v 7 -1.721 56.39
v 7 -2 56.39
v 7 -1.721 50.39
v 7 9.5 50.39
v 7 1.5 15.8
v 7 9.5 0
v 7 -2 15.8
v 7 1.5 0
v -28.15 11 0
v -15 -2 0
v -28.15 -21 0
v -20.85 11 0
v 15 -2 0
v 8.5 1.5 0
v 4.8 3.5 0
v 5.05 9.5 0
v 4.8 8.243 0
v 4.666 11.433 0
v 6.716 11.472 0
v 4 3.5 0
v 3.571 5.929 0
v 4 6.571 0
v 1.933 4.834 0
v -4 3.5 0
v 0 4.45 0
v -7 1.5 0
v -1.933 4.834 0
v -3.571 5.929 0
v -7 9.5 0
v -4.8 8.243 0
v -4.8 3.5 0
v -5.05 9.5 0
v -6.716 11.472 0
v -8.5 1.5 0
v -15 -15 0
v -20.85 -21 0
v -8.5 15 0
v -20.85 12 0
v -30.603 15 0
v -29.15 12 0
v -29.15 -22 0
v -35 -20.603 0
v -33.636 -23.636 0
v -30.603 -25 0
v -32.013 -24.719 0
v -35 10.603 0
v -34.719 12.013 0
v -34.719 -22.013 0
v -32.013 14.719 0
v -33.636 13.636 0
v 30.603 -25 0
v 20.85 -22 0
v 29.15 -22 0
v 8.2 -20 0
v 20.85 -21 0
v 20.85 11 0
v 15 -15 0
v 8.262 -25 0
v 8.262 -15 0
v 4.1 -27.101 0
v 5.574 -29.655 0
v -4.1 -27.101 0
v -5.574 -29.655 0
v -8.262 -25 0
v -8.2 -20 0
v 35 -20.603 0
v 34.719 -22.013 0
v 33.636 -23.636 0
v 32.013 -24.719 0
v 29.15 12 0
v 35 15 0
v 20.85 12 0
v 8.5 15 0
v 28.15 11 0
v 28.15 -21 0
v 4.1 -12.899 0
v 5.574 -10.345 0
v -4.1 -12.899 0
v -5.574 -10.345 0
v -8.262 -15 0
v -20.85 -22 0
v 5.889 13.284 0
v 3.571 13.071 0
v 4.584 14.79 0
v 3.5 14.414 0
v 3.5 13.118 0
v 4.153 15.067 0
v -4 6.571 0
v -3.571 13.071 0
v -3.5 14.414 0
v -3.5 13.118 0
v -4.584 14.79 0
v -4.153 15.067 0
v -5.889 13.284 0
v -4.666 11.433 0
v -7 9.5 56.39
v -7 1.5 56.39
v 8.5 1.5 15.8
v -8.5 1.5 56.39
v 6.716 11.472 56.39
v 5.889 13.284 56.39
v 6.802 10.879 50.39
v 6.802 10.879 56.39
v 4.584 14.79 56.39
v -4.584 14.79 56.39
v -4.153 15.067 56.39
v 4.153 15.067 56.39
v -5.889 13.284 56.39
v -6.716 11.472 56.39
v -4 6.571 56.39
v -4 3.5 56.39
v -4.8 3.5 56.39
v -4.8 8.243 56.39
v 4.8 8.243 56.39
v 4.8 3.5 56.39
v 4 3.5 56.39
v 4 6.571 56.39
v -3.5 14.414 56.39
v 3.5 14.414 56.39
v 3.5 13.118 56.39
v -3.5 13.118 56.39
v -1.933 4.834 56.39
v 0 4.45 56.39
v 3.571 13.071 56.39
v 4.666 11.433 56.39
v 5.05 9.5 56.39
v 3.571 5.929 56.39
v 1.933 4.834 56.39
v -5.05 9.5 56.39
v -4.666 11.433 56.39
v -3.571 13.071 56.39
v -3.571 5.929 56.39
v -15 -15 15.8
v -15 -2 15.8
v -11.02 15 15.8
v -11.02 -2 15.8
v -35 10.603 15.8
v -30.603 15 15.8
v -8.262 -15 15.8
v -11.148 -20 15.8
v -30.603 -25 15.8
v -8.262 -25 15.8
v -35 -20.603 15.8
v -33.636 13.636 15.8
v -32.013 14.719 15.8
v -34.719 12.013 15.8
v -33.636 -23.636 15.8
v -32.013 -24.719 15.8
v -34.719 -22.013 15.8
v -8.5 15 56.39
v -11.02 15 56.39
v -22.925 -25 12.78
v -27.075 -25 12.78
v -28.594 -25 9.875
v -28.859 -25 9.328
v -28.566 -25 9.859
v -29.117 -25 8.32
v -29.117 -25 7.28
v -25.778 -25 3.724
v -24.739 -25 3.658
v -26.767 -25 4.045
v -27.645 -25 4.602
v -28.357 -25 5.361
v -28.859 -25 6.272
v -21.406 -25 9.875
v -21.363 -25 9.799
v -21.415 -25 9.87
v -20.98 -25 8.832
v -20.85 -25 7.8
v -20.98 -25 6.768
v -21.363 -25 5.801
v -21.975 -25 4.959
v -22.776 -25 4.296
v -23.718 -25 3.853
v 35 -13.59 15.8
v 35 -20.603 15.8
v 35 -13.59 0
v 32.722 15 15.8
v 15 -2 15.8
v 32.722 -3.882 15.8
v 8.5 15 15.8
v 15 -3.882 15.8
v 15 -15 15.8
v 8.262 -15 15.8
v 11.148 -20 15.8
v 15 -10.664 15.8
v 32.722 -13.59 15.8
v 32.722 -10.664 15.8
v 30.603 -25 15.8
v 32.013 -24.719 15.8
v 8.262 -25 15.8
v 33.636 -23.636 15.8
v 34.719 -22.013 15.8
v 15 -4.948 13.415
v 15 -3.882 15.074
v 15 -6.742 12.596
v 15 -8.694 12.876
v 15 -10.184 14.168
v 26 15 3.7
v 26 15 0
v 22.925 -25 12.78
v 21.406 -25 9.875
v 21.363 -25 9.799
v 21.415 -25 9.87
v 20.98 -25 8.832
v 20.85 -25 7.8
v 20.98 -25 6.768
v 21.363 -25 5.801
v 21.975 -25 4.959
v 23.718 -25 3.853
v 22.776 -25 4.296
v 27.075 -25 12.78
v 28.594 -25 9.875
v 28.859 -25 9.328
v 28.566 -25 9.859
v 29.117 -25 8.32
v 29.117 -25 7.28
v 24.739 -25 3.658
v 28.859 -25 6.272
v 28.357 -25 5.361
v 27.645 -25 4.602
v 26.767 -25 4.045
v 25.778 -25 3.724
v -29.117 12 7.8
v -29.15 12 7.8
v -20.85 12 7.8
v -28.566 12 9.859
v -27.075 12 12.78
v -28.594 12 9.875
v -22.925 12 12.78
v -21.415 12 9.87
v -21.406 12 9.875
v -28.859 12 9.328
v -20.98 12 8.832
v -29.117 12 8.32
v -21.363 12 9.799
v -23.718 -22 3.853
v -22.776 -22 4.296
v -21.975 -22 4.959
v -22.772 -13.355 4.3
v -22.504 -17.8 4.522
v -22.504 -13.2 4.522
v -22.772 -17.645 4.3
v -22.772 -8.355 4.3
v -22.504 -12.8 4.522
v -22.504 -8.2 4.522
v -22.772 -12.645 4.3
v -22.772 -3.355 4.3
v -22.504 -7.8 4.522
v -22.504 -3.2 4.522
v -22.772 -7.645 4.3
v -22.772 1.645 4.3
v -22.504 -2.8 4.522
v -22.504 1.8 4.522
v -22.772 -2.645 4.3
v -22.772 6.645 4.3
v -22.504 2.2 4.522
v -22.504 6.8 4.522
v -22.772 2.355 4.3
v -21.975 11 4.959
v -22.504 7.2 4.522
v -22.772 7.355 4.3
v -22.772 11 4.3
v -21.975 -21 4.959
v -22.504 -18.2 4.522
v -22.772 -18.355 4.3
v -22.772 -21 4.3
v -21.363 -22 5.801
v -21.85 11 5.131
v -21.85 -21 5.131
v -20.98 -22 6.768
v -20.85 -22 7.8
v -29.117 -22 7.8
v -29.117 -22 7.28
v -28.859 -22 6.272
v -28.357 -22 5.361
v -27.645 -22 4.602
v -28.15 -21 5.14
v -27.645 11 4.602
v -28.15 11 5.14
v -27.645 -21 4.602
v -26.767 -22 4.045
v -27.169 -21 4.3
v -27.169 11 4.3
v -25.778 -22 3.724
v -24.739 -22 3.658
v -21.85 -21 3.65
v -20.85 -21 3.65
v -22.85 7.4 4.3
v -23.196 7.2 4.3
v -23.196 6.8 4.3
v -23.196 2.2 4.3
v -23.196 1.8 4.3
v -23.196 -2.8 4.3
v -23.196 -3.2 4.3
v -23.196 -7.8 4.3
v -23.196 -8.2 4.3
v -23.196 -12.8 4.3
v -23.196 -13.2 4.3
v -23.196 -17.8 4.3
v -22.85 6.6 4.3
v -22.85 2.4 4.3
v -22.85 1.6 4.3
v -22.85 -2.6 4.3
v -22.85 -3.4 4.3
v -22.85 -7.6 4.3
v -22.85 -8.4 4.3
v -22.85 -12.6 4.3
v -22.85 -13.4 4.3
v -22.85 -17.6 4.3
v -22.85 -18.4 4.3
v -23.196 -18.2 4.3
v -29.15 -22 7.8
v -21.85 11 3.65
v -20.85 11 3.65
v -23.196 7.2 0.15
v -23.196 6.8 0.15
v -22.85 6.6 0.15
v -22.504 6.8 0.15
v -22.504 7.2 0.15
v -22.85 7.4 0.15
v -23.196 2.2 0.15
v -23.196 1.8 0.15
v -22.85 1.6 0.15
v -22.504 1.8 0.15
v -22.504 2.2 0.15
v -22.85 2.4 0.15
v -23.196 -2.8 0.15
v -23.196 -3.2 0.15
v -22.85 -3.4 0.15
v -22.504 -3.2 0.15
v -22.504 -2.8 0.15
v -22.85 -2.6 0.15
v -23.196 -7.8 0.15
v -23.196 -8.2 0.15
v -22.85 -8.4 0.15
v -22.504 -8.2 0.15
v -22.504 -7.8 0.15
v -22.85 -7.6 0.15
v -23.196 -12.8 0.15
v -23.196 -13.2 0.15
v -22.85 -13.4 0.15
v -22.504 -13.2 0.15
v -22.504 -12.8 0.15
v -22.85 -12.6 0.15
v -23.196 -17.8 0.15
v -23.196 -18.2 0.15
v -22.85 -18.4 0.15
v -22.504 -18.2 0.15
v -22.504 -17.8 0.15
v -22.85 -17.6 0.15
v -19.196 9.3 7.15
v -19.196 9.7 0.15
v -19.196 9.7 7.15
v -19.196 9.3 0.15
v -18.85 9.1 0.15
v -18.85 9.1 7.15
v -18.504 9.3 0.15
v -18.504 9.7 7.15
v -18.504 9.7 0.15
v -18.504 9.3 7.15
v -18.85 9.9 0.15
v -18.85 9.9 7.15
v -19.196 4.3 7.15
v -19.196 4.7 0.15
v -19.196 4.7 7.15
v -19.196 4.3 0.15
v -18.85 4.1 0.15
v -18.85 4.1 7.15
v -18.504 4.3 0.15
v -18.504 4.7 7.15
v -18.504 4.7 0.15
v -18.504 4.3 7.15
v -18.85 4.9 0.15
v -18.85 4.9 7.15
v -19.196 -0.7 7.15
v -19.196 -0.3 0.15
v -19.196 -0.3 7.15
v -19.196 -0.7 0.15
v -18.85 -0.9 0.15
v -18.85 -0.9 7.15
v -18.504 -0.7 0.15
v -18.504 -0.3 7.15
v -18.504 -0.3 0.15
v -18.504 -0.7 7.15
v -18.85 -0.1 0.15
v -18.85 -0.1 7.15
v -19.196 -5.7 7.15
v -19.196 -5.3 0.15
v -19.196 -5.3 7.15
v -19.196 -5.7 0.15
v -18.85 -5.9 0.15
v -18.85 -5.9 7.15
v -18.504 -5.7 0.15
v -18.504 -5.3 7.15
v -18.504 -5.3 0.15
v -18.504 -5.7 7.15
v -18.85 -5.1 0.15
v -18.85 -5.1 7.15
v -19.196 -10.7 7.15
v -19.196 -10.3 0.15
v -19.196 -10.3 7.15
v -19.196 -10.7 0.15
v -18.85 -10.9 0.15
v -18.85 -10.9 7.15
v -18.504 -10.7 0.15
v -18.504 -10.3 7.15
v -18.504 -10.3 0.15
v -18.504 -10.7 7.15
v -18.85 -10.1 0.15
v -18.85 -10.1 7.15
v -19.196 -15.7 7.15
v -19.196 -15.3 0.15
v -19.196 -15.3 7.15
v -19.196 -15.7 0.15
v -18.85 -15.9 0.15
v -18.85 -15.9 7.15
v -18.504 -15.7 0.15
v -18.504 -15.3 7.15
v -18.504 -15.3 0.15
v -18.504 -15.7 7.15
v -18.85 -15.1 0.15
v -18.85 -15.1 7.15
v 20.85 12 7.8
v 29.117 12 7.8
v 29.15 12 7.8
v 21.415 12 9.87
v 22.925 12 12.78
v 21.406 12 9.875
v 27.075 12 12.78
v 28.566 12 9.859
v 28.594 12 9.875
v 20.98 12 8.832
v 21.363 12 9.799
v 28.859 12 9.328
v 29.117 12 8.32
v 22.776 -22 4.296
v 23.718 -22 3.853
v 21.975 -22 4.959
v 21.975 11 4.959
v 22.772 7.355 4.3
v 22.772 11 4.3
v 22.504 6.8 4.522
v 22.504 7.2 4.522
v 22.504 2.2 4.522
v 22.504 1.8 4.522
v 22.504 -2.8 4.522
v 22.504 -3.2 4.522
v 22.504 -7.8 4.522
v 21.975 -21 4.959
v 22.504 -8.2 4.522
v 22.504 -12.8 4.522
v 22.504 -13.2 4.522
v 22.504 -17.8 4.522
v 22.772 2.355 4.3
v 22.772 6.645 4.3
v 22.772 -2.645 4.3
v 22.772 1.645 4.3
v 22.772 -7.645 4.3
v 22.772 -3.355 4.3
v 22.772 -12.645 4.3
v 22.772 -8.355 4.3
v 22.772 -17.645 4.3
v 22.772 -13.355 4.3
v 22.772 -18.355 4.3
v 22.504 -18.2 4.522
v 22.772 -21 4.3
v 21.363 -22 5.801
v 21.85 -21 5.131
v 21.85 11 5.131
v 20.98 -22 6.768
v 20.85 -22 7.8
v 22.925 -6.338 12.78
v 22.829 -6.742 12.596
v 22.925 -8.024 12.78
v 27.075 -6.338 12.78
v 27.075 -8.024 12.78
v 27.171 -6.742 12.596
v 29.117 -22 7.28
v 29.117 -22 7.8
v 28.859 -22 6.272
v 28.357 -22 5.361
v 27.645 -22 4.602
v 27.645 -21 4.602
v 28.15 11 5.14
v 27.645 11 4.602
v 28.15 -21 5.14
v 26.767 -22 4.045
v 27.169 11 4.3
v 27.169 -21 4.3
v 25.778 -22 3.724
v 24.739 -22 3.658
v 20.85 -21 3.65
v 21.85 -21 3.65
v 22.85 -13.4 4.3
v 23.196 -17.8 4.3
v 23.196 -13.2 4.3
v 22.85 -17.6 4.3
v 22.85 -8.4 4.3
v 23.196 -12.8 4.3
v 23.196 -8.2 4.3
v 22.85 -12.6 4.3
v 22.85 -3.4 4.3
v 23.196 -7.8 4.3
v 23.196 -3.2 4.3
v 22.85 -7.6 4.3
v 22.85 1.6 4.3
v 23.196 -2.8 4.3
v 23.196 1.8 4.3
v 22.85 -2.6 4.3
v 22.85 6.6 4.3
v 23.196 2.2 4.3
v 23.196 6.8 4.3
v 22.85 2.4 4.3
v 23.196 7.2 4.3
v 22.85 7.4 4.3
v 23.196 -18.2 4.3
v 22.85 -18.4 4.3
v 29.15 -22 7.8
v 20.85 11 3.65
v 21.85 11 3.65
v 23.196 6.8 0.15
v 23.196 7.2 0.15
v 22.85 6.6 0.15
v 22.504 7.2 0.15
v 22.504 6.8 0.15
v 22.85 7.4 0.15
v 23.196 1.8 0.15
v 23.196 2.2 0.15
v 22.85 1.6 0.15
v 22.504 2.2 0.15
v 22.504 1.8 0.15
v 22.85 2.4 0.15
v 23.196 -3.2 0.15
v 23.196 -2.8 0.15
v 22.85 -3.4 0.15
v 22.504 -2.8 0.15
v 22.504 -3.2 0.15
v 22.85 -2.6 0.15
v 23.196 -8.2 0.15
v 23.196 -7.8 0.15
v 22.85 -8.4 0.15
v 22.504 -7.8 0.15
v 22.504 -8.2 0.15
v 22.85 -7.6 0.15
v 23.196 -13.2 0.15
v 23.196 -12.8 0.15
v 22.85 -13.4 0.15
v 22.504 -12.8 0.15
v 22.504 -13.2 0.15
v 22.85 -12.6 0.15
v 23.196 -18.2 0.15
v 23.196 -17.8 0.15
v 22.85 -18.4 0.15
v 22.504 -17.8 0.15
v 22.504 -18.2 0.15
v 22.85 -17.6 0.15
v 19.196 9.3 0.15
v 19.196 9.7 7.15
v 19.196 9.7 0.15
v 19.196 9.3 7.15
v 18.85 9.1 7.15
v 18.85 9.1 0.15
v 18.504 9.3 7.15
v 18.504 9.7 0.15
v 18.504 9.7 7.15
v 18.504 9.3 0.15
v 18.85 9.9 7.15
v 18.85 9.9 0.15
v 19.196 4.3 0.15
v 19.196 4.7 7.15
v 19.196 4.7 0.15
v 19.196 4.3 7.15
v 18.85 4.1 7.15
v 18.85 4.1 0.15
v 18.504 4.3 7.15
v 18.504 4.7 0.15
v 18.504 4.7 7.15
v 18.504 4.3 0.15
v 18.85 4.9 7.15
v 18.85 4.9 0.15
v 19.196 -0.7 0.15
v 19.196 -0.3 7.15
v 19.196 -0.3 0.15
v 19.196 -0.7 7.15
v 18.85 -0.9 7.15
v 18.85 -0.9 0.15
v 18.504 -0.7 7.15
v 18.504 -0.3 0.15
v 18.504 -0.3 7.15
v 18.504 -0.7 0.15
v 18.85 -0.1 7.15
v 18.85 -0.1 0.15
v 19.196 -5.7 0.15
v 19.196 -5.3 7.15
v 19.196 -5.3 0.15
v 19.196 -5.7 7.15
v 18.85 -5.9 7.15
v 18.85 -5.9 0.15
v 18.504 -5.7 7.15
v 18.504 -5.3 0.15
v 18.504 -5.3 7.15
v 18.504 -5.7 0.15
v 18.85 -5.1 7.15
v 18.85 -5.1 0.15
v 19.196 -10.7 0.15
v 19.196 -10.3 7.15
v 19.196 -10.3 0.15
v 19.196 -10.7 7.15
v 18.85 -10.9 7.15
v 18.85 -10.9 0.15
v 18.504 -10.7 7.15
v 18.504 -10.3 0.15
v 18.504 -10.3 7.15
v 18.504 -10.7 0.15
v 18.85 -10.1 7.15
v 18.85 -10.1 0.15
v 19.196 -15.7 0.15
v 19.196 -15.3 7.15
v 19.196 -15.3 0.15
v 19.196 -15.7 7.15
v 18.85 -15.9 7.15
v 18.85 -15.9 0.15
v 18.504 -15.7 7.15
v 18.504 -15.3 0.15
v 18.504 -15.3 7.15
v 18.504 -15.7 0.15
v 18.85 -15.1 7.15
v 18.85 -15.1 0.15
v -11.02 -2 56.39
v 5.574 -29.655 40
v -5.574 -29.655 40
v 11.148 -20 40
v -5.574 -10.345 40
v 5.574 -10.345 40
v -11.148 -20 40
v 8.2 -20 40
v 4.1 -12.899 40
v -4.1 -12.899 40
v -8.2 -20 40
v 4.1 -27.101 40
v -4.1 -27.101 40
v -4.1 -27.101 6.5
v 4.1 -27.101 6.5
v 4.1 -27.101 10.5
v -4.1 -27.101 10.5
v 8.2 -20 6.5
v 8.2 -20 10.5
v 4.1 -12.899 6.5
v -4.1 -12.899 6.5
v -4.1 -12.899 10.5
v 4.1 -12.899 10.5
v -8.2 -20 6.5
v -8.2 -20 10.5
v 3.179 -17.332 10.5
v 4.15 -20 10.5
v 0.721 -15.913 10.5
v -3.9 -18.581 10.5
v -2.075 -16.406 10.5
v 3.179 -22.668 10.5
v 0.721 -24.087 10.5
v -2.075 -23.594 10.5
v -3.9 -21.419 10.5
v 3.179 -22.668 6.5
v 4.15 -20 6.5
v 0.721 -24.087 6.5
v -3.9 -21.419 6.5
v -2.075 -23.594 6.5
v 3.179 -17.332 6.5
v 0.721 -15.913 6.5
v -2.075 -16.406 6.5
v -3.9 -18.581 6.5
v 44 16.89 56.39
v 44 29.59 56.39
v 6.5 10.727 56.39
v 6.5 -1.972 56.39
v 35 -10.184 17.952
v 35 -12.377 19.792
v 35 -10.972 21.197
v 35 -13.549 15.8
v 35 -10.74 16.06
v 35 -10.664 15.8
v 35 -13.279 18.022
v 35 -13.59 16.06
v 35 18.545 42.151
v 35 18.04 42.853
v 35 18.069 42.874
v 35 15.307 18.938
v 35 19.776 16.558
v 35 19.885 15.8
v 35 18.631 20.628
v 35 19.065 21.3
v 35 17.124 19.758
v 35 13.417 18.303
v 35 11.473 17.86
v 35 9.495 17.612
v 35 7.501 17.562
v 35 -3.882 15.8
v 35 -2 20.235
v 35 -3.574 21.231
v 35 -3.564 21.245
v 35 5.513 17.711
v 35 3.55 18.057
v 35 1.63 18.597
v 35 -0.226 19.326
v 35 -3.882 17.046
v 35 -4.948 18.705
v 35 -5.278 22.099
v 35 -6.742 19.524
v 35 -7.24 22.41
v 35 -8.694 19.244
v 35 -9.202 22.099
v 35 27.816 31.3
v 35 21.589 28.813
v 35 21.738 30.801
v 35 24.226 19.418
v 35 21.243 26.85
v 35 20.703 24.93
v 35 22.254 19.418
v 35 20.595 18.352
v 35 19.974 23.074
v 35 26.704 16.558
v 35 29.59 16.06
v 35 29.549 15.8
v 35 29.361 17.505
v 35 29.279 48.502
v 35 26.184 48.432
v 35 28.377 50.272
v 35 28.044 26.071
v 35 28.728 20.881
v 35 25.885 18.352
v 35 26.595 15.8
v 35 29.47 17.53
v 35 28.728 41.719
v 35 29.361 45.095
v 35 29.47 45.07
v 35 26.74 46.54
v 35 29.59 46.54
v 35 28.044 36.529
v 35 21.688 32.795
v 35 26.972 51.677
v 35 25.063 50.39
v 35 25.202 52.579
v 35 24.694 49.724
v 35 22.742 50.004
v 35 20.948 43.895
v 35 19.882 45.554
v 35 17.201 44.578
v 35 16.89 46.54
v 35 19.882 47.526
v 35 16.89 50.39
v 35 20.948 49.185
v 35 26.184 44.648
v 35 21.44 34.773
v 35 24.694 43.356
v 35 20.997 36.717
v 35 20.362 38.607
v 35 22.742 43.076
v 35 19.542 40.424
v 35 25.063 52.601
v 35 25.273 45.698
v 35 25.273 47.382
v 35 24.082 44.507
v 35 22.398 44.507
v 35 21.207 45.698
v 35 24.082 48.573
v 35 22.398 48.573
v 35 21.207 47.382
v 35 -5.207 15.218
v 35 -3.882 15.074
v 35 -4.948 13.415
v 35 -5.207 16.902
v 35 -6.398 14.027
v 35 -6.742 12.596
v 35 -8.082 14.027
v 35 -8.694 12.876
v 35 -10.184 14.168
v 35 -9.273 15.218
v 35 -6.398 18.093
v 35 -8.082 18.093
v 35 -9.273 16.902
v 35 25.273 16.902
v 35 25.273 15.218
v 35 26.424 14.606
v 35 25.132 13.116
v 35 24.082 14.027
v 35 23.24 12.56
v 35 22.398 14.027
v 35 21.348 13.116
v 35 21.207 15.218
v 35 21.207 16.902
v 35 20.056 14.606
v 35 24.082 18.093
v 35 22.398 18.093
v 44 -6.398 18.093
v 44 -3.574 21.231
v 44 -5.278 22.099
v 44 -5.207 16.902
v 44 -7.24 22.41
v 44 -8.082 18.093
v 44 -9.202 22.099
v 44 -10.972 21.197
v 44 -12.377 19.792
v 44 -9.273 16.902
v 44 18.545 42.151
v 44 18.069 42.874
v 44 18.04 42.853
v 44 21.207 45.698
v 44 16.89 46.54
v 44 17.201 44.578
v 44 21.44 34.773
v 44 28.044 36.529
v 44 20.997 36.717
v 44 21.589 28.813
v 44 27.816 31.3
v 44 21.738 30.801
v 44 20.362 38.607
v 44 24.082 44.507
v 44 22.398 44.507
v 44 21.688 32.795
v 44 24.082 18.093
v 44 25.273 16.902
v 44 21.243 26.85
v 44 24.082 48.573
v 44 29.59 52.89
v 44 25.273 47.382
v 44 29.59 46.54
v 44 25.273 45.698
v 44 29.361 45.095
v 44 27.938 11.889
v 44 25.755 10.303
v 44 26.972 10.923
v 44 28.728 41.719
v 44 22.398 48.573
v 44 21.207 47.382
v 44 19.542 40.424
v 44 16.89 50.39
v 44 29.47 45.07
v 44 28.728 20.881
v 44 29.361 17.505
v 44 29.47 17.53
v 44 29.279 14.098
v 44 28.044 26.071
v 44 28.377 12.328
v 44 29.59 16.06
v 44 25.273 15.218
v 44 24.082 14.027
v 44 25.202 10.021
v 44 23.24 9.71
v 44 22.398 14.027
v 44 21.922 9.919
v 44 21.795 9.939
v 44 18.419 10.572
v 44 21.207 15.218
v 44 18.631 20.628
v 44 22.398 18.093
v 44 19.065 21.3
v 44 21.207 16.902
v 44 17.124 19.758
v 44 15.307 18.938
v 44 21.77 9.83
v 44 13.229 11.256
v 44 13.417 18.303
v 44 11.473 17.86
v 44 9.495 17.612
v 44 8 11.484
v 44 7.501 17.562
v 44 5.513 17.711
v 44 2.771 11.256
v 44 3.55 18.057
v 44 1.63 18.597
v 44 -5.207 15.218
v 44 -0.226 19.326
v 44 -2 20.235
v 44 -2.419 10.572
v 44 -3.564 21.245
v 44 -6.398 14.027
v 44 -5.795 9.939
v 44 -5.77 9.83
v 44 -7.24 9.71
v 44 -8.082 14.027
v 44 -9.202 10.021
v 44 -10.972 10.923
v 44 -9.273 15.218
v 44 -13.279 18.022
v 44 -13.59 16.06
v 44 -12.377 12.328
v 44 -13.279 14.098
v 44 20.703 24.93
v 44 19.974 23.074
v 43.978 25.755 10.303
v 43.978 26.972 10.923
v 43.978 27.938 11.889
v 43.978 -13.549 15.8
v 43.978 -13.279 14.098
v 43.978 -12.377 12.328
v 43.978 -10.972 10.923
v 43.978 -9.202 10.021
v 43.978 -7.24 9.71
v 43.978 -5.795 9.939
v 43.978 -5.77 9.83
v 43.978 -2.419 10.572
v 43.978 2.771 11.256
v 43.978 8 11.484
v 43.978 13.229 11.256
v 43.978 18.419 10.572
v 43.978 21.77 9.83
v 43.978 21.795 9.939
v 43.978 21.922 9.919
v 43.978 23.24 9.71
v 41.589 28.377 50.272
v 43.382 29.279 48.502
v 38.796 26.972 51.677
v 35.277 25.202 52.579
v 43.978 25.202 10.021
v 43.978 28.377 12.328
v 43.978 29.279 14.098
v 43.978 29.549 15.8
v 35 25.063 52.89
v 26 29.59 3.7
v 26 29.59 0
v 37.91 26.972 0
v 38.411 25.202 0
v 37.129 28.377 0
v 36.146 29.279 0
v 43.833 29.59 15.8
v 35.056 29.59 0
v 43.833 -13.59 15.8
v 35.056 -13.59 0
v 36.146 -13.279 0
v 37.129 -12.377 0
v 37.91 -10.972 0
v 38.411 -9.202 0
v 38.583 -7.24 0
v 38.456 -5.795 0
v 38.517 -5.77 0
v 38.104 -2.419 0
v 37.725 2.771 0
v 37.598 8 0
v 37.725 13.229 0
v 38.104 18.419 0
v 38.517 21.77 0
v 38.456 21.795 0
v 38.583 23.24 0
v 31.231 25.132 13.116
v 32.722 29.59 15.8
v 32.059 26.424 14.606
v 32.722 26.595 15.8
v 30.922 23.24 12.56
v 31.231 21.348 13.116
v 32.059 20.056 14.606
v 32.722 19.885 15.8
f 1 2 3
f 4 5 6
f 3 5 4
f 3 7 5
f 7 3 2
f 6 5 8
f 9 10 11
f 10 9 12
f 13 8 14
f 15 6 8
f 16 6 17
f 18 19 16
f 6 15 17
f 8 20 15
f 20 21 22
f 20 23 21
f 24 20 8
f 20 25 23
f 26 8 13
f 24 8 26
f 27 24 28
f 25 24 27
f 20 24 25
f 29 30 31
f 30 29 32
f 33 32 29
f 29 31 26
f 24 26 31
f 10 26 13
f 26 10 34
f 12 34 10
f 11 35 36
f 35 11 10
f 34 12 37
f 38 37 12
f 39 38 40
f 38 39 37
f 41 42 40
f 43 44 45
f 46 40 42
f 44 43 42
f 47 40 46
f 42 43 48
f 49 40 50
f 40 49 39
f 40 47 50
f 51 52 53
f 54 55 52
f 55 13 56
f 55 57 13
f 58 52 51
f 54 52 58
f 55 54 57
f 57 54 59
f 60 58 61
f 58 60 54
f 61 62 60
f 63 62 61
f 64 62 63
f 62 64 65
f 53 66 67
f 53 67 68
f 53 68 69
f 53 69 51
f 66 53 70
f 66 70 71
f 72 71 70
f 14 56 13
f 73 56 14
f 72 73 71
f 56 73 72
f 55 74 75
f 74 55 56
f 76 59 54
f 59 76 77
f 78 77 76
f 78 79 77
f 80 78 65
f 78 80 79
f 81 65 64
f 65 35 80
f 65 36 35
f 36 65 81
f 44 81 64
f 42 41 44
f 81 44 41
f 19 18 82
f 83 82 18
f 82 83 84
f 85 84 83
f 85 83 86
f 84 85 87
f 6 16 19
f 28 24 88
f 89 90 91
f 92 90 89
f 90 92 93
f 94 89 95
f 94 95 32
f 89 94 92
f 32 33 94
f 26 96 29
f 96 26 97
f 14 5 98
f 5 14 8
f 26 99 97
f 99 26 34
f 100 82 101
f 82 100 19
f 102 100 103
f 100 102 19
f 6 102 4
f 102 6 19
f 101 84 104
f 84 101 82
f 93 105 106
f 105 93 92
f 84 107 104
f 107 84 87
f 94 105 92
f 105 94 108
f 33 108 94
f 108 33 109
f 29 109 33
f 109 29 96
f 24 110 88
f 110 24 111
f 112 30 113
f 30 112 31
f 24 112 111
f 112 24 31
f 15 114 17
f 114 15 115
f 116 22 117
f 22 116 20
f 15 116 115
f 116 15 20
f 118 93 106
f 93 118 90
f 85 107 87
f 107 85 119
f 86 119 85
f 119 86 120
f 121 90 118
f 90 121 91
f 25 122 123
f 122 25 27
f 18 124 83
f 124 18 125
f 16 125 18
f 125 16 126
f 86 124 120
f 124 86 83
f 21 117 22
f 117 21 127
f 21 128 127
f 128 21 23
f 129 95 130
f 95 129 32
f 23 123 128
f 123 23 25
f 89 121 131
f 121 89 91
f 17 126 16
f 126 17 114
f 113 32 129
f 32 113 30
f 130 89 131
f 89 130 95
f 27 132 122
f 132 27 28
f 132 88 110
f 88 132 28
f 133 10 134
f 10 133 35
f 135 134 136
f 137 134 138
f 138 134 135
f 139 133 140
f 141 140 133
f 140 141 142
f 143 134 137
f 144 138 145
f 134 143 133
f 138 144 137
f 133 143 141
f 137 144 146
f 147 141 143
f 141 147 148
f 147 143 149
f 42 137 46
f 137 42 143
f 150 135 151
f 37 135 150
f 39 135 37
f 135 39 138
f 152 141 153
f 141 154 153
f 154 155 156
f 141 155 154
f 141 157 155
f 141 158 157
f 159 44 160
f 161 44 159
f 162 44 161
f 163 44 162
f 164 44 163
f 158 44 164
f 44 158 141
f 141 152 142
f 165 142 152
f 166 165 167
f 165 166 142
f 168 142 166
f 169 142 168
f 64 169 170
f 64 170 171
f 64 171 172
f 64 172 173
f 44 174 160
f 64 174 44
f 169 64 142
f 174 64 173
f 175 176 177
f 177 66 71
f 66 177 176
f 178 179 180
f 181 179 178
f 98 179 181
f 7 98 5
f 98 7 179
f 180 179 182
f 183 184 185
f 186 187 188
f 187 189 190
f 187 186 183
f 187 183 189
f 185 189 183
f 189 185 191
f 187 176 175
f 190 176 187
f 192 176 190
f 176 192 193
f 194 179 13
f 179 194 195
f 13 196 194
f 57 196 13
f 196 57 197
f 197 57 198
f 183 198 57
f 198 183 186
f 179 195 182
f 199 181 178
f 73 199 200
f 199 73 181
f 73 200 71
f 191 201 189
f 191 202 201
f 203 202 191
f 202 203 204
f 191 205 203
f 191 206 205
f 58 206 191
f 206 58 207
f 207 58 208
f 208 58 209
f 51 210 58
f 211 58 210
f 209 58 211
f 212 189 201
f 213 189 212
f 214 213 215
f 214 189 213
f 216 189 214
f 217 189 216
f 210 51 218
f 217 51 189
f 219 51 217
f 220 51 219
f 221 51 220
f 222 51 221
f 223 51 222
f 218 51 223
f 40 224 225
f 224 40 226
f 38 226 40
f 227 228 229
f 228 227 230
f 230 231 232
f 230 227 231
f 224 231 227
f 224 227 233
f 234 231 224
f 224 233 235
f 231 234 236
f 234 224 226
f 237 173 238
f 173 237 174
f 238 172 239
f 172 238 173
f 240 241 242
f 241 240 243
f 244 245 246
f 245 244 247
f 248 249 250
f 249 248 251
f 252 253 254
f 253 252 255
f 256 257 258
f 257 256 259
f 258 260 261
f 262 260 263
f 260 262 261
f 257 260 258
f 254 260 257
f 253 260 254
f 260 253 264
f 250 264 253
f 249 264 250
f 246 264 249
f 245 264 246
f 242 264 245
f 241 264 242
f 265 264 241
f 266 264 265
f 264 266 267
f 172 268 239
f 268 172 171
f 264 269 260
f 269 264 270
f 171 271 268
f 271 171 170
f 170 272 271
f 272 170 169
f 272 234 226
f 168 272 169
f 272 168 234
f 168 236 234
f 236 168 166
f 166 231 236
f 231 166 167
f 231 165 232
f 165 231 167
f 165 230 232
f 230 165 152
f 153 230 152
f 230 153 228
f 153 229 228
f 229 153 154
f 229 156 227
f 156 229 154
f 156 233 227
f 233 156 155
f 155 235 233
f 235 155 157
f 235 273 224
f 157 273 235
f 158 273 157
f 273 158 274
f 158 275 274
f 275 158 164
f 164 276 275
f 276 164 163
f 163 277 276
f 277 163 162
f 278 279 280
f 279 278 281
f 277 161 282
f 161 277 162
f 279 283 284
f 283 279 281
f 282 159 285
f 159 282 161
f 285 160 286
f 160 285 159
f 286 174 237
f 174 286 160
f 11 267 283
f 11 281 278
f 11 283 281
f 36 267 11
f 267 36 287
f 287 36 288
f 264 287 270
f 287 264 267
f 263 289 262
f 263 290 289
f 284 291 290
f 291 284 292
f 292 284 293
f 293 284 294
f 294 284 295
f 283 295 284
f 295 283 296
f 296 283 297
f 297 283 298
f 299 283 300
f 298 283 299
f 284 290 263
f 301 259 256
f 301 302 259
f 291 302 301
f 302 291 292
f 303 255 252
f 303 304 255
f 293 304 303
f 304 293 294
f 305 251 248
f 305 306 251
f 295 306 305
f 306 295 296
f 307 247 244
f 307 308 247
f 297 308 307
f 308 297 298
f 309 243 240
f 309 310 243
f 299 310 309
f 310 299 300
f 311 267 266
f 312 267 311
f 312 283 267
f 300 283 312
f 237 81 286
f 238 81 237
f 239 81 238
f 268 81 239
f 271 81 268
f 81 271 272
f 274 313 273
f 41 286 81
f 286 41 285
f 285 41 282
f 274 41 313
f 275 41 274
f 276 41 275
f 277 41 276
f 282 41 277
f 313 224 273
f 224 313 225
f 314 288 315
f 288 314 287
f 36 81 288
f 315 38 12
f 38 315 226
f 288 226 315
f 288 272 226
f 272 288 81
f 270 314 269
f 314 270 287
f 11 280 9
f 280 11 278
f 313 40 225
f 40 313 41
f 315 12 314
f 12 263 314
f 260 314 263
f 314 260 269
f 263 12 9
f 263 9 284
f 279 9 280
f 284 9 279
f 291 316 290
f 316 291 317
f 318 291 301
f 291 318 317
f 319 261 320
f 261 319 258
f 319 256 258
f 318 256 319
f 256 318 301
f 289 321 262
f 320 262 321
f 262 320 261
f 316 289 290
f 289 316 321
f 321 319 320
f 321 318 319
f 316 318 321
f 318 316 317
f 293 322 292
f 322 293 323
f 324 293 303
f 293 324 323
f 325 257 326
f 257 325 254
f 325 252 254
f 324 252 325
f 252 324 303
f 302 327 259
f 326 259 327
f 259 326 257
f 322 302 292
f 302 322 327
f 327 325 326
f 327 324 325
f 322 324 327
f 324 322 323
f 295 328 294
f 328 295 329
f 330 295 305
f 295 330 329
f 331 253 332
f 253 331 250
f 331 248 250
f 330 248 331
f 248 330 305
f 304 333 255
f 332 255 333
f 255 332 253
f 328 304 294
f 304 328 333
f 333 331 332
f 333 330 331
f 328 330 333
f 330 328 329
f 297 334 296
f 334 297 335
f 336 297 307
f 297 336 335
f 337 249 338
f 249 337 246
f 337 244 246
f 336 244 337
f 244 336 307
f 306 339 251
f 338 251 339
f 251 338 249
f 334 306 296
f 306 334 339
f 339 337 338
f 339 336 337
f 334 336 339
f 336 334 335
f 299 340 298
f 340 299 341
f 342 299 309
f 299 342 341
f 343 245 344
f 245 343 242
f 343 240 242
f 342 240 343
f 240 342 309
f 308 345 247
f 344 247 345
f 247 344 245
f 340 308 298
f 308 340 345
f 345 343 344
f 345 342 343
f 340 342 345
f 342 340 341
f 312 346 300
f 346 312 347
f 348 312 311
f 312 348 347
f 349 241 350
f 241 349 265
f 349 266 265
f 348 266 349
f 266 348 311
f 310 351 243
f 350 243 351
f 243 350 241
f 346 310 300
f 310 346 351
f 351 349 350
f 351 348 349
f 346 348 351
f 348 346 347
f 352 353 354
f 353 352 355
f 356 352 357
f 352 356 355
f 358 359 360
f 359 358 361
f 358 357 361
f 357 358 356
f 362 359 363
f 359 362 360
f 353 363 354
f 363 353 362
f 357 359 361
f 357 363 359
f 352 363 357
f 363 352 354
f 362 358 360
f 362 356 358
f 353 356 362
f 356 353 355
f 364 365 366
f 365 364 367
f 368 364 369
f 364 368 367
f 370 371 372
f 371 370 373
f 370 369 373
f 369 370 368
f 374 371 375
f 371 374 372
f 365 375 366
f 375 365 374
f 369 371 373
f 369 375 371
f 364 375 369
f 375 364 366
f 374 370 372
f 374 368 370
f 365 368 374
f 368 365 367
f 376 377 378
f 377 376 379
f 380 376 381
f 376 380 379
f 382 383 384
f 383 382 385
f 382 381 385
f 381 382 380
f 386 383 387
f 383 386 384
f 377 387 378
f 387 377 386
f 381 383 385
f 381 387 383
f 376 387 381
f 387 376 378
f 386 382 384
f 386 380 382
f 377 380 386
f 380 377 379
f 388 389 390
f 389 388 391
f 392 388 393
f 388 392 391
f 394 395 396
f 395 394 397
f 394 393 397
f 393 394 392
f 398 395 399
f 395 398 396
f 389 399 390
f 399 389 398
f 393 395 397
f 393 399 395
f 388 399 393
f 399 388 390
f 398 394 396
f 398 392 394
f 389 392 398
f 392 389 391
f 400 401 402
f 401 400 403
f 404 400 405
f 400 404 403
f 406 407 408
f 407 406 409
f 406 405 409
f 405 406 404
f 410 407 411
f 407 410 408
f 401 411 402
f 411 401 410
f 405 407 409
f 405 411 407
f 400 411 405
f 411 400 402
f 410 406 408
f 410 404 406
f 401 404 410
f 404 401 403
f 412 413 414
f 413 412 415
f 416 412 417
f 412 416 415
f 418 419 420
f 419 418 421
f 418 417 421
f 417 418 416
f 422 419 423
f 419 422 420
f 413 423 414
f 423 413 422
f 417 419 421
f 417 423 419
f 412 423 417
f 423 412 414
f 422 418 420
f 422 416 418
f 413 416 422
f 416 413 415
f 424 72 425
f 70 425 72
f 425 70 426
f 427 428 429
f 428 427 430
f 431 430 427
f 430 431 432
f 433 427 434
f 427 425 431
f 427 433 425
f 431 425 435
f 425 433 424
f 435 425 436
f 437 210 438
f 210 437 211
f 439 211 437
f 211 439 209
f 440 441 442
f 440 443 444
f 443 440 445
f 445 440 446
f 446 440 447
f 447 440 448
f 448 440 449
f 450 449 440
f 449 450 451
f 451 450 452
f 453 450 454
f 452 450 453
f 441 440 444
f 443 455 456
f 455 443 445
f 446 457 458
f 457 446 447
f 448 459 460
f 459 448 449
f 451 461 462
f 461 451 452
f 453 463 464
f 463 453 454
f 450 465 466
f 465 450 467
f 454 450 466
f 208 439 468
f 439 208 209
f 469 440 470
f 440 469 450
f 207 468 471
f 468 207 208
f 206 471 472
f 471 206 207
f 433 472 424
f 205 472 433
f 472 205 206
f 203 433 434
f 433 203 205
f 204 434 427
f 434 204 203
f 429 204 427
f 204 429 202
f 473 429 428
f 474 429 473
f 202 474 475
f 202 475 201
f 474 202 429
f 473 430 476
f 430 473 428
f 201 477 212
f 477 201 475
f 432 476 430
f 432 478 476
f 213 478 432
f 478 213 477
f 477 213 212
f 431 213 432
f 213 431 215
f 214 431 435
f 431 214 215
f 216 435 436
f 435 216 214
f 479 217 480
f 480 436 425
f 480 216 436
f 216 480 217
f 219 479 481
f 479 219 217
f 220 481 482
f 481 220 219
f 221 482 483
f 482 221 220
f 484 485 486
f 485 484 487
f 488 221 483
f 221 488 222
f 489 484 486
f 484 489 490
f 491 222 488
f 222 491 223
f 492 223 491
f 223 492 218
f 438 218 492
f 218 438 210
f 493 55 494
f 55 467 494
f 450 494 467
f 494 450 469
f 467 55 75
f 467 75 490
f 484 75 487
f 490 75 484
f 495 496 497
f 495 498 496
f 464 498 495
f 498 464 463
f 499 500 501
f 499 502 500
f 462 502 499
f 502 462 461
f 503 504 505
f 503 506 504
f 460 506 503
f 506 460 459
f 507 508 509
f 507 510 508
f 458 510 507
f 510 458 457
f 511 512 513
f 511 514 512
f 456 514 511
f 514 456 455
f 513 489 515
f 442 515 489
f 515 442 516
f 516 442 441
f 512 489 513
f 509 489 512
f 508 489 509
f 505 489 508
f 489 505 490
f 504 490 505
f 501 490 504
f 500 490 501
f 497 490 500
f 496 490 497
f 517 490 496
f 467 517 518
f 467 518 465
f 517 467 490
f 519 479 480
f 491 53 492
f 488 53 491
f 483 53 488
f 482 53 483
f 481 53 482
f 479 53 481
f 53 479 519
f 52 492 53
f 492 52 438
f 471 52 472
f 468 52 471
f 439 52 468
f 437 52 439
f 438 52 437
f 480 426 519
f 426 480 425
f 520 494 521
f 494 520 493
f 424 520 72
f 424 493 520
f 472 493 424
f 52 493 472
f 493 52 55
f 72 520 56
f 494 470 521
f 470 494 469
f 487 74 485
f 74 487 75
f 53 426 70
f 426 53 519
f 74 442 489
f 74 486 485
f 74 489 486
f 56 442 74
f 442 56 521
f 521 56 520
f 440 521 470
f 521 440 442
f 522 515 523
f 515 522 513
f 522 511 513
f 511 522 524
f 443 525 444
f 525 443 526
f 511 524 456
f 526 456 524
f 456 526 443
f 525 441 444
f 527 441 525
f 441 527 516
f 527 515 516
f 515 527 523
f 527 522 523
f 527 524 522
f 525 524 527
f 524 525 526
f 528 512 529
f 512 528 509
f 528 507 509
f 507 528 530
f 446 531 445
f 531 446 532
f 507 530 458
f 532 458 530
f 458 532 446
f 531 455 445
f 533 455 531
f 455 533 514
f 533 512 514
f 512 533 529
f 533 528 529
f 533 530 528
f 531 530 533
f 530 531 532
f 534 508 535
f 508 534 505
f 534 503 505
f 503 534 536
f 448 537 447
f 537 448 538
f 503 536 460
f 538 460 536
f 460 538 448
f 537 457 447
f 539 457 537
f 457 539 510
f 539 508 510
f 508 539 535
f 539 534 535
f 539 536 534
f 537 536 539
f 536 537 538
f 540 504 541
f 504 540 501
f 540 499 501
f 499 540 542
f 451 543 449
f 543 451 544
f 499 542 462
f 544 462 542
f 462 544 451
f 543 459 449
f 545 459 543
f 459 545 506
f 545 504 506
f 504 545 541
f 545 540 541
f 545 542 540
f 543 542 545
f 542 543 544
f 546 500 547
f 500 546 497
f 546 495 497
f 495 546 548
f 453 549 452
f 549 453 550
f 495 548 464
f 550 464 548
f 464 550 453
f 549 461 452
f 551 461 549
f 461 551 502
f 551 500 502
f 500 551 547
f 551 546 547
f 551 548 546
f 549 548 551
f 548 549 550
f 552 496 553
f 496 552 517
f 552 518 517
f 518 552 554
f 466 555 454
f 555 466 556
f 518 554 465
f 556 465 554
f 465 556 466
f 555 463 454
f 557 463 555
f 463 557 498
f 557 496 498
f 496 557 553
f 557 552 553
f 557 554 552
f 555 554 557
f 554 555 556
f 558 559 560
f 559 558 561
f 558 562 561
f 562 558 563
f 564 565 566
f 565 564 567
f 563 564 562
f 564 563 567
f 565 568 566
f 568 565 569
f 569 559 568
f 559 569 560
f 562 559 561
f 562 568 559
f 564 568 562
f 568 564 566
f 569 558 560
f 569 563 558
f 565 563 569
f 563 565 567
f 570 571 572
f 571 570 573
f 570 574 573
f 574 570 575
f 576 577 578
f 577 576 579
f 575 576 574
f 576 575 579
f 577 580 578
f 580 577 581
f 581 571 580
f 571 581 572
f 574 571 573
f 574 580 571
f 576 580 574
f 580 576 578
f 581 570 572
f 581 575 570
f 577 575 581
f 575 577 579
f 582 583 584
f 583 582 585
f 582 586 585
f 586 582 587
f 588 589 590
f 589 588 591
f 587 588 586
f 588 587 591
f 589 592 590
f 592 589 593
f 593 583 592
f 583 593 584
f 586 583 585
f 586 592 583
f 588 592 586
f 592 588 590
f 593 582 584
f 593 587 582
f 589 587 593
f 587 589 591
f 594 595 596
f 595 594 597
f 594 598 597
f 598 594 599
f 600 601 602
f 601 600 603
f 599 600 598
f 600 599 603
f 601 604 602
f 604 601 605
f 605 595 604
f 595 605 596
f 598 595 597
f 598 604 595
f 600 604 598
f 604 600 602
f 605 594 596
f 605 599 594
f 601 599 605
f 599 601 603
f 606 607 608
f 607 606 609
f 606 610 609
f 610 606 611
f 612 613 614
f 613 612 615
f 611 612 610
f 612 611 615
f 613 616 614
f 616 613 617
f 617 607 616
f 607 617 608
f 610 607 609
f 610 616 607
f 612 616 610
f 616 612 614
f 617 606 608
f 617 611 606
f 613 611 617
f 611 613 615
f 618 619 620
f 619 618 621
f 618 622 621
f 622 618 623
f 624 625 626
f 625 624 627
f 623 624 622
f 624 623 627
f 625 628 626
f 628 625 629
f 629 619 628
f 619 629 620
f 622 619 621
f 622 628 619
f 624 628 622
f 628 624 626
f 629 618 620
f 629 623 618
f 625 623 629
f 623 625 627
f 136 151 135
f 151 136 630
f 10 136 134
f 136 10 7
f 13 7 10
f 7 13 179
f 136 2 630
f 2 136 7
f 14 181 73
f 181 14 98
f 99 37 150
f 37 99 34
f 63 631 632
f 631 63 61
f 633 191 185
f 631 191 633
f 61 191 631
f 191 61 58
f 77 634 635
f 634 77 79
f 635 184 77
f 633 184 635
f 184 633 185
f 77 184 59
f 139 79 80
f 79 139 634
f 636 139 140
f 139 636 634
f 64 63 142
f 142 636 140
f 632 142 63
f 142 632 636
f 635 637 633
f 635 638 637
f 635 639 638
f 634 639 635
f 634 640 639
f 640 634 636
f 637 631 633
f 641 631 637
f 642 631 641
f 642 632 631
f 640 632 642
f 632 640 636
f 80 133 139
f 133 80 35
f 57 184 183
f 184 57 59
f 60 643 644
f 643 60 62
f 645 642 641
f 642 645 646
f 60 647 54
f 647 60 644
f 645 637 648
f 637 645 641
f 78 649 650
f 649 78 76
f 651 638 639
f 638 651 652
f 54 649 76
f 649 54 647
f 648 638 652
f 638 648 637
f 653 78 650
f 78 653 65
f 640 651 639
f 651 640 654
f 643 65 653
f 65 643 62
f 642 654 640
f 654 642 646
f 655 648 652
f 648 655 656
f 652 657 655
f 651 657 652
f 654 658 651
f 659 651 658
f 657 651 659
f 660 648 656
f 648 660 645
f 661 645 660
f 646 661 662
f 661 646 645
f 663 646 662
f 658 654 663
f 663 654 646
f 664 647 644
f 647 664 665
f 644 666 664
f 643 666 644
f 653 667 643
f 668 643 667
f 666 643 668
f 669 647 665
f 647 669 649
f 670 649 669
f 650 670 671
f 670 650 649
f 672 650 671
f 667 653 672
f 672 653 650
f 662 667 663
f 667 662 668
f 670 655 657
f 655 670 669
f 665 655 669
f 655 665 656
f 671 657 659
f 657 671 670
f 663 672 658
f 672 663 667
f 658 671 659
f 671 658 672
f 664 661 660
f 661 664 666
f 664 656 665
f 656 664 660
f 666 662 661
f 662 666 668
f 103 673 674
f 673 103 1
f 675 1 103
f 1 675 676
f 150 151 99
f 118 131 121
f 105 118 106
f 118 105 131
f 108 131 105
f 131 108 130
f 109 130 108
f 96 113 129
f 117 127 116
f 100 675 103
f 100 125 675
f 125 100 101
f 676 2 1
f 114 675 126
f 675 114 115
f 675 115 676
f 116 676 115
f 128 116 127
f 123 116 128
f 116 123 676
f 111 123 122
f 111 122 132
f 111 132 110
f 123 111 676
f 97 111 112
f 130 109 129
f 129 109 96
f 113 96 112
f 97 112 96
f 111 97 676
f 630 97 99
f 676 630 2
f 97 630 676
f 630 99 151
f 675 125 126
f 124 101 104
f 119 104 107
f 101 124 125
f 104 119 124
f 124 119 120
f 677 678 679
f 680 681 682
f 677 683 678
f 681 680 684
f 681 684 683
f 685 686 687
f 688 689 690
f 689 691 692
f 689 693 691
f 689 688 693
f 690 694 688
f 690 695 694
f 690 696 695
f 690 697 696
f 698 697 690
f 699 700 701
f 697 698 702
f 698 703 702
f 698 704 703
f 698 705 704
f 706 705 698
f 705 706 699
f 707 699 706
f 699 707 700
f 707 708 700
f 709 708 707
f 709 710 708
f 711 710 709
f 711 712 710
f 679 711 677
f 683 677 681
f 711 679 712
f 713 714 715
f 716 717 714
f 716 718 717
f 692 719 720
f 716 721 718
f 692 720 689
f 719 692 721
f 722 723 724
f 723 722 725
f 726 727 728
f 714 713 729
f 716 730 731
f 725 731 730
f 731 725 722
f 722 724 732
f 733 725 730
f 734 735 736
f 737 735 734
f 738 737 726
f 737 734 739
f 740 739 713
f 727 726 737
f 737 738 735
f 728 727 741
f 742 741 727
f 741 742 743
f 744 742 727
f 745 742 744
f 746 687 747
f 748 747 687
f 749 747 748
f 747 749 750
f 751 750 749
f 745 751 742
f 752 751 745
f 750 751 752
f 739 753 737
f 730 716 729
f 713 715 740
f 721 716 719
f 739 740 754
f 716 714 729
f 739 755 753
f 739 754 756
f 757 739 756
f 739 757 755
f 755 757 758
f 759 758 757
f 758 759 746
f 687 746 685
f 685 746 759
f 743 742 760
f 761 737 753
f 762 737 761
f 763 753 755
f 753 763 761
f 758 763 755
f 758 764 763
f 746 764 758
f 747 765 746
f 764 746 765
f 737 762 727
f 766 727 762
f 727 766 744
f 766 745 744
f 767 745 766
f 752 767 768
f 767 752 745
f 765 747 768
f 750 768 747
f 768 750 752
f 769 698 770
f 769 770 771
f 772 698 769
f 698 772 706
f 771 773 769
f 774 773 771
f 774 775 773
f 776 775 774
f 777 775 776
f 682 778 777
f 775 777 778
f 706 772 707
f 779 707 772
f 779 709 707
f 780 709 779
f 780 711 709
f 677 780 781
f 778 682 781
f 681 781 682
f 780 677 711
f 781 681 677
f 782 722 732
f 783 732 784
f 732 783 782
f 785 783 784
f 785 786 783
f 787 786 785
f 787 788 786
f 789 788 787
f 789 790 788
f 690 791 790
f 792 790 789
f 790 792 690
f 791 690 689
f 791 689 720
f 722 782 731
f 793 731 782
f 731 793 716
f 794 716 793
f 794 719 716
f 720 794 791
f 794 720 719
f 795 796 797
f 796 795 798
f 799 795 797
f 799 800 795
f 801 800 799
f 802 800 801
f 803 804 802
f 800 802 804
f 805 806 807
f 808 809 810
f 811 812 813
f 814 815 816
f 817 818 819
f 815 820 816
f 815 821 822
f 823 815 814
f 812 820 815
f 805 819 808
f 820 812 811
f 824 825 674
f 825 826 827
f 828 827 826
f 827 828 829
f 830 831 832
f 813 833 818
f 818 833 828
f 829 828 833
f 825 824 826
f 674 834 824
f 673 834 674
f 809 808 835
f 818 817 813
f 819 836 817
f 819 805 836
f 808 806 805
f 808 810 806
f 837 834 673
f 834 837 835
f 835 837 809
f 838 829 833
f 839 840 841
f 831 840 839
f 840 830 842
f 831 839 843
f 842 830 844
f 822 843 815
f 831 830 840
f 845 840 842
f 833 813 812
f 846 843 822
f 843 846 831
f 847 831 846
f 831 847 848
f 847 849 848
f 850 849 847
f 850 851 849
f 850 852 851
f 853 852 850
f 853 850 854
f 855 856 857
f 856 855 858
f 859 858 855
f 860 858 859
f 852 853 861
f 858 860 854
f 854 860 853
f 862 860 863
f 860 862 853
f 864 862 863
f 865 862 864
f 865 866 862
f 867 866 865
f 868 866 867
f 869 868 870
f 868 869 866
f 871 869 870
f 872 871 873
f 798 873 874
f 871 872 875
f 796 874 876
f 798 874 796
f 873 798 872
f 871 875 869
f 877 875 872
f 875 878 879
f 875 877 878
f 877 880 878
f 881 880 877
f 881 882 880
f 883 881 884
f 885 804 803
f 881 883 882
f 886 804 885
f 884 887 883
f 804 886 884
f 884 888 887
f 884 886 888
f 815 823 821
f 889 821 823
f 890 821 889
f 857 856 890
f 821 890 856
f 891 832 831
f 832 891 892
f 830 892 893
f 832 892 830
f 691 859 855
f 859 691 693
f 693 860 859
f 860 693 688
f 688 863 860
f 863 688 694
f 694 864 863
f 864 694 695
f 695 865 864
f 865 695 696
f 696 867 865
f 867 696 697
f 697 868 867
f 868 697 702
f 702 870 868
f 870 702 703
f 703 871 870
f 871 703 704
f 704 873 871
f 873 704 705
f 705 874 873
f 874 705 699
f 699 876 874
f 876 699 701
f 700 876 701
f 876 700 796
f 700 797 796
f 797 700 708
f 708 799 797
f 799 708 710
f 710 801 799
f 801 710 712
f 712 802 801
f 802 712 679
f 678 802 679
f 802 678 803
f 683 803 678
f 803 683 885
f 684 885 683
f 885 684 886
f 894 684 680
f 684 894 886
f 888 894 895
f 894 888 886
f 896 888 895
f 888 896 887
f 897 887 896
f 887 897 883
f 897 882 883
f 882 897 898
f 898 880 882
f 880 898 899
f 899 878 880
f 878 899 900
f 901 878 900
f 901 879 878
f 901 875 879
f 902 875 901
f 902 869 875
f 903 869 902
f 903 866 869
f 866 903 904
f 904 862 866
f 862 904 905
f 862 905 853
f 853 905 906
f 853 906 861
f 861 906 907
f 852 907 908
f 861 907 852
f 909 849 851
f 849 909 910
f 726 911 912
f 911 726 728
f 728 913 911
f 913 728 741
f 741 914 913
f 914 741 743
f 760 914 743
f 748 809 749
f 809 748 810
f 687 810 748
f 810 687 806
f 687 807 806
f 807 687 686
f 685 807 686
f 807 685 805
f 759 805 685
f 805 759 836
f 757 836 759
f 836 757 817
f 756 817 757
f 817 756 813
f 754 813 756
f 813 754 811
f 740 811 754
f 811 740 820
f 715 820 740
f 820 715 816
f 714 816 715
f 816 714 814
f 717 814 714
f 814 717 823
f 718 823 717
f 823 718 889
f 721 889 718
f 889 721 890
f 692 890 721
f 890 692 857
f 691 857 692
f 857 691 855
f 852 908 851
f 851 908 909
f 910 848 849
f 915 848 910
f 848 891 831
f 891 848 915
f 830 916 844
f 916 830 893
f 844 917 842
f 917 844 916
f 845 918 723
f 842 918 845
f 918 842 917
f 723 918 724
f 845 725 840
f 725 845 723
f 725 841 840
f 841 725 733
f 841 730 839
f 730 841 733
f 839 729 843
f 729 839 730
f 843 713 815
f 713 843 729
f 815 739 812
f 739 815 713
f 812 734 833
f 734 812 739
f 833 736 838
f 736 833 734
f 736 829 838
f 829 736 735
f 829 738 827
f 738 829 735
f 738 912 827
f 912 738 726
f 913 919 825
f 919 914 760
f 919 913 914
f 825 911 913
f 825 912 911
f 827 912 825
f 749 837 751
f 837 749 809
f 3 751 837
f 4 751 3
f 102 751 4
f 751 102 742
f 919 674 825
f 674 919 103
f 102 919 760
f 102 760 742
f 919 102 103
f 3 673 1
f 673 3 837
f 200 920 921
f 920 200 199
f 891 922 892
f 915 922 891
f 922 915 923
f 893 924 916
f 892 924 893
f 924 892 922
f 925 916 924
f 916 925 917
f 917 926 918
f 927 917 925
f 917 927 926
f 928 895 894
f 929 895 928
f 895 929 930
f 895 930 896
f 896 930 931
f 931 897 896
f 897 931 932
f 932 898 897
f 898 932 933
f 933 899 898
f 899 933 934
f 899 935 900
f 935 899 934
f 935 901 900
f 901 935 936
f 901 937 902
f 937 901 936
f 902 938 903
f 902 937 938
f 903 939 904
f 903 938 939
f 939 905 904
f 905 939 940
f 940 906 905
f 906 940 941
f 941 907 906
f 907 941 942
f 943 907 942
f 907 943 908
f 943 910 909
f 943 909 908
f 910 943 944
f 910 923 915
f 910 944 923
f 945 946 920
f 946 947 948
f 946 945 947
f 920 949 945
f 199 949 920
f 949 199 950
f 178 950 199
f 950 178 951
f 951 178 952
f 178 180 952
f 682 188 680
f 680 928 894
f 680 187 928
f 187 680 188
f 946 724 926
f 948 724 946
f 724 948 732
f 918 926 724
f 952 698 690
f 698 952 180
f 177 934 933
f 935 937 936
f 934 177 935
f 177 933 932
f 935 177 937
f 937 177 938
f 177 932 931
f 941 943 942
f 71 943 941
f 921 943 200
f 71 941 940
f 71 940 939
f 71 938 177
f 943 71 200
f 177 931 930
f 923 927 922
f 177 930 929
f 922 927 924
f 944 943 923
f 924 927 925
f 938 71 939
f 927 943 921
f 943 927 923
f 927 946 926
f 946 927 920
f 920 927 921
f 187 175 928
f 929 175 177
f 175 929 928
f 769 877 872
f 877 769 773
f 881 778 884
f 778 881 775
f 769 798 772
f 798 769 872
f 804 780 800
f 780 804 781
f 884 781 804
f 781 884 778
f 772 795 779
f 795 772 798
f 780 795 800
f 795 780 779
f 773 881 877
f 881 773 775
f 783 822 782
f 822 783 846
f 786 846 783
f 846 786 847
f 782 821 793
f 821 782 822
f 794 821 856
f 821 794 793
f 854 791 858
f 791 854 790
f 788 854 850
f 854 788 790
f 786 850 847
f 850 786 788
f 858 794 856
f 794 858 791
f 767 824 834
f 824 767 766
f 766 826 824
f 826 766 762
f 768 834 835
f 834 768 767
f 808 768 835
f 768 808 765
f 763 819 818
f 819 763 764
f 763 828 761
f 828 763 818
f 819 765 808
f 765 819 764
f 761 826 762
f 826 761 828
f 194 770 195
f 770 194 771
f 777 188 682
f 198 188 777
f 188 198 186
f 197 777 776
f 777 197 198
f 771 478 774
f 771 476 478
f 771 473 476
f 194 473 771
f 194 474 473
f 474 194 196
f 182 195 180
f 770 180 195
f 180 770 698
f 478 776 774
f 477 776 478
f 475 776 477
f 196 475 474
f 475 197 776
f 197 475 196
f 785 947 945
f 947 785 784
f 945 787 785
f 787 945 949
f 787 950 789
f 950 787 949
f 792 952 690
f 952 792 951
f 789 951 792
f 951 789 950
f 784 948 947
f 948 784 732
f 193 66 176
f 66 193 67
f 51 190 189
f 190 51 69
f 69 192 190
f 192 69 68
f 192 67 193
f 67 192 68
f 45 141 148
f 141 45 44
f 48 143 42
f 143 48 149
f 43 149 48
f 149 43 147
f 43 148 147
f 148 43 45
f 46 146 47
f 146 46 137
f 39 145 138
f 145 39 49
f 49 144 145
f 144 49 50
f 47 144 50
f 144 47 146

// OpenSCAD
// file: teardrop.scad
teardropcentering2();

module teardrop (r=4.5,h=20)
{
	rotate([-270,0,90])
	linear_extrude(height=h)
	{
		circle(r=r, $fn = 25);
		polygon(points=[[0,0],[r*cos(30),r*sin(30)],[0.5*r,r],[-0.5*r,r],[-r*cos(30),r*sin(30)]],
				paths=[[0,1,2,3,4]]);
	}
}

module teardropcentering (r=4.5,h=20)
{
	rotate([-270,0,90])
	linear_extrude(height=h)
	{
		circle(r=r, $fn = 25);
		polygon(points=[[0,0],[r*cos(30),r*sin(30)],[0.5*r,1.2*r],[-0.5*r,1.2*r],[-r*cos(30),r*sin(30)]],
				paths=[[0,1,2,3,4]]);
	}
}

module teardropcentering2 (r=4.5,h=20)
{
	//rotate([-270,0,90])
	difference(){
	linear_extrude(height=h)
	{
		circle(r=r, $fn = 25);
		polygon(points=[[0,0],[r*cos(30),r*sin(30)],[0.5*r,1.2*r],[-0.5*r,1.2*r],[-r*cos(30),r*sin(30)]],
				paths=[[0,1,2,3,4]]);
	}
	translate(v = [-1.5*r, -1.5*r,-1])cube(size =[3*r,1.5*r,h+2]);
	}
}
// file: bushing.scad
// PRUSA Mendel  
// Bushings
// GNU GPL v2
// Josef Průša
// josefprusa@me.com
// prusadjs.cz
// http://www.reprap.org/wiki/Prusa_Mendel
// http://github.com/prusajr/PrusaMendel

include <configuration.scad>

/**
 * @name Bushing
 * @category Printed
 * @link bushing
 */ 

rodsize = bushing_rodsize+0.1;
outerDiameter = bushing_outerDiameter;
lenght = bushing_lenght;
type = bushing_type;


module bushing(stiff, lenght=11){
	difference(){
		union(){
			translate(v=[-7,-8,0])cube(size = [14,8,lenght]);
			cylinder(h = lenght, r=7);
		}
	//cutout inside
	//Opening
	rotate(a=[0,0,45]) translate(v=[1,1,-1]) cube(size = [16,16,lenght+2]);
	//Cutouts to make it more bendy
	if(stiff){
		translate(v=[-4.8,-6,-1]) cube(size = [0.8,6,lenght+2]);
		translate(v=[4,-6,-1]) cube(size = [0.8,6,lenght+2]);
	}else{
		translate(v=[-4.8,-8,-1]) cube(size = [0.8,8,lenght+2]);
		translate(v=[4,-8,-1]) cube(size = [0.8,8,lenght+2]);
	}
	translate(v=[0,5,(lenght+2)/2]) cube(size = [7,8,lenght+2], center=true);
	translate(v=[0,0,-1]) cylinder(h = lenght+2, r=(rodsize+2)/2);
	}
}
module do_bushing(base_depth){
translate([0,0,8+base_depth]) rotate([90,0,0])
difference(){
	union(){
		bushing(false, 11);
		translate(v=[-7,-8-base_depth,0])cube(size = [14,base_depth,15]);
		translate(v=[-7,-8-base_depth,13])cube(size = [14,base_depth+3,2]);
	}
	translate([0,-6-base_depth,5.5]) rotate([90,0,0]) cylinder(h=base_depth+2,r=2.7/2,center=true, $fn=12);
}
}

do_bushing(4);
// file: configuration.scad
// PRUSA Mendel  
// Configuration file
// GNU GPL v2
// Josef Průša
// josefprusa@me.com
// prusadjs.cz
// http://www.reprap.org/wiki/Prusa_Mendel
// http://github.com/prusajr/PrusaMendel

// PLEASE SELECT ONE OF THE CONFIGURATIONS BELOW
// BY UN-COMMENTING IT

variant=0; //0 for metric
//variant=1; //1 for SAE
if(variant==0){
echo("variant: metric");
}else if(variant==1){
echo("variant: sae");
} else{
echo("WARNING: INVALID CONFIGURATION");
}


vars=[
//[m8_dia, m8_nut, m4_dia, m4_nut, m3_dia, m3_nut, bush_dia, mot_shaft, bush_rod, bush_outerdia, bush_length]
[8.3,16.4,4.3,9,3.3,7,11,5.3,8,16,11],//metric
[9,15.7,5.5,10.6,5.5,10.6,11.5,5.3,7.9375,16,11]//SAE
];

//BUSHING TYPE Can generate three versions
// 1 - regular old ones
// 2 - helical ones
// 3 - holders for brass or any other bought bushings
bushing_type = 2;

//Round corner diameter
round_corner_diameter = 8;

//X end parameters
axis_diameter_real = 4;
axis_diameter_larger = 4.2 ;
pressure_pad_height = 0.7;

//Thin wall size
layer_height = 0.4;
perimeter_width_over_thicknes = 1.6;
infill_widht_over_thickness = 1.55;
thin_wall = 2*(perimeter_width_over_thicknes*layer_height+infill_widht_over_thickness*layer_height);
if(thin_wall<2){
	echo("Check thin wall size, its below 2mm!");
}
echo(thin_wall);

//DO NOT TOUCH THIS SECTION!
m8_diameter = vars[variant][0];
m8_nut_diameter = vars[variant][1];
m4_diameter = vars[variant][2];
m4_nut_diameter = vars[variant][3];
m3_diameter = vars[variant][4];
m3_nut_diameter = vars[variant][5];
bushing_diameter = vars[variant][6];
motor_shaft=vars[variant][7];
bushing_rodsize = vars[variant][8];
bushing_outerDiameter = vars[variant][9];
bushing_lenght = vars[variant][10];


// MINI-HUXLEY VERSION (TODO, just place holder)
// include <configuration-huxley.scad>

// MEGA VERSION (TODO, just place holder)
// include <configuration-mega.scad>


// Some basic functions, probably should be somewhere else
module roundcorner(diameter){
	difference(){
		cube(size = [diameter,diameter,99], center = false);
		translate(v = [diameter, diameter, 0]) cylinder(h = 100, r=diameter, center=true);
	}
}
module polyhole(h, d) {
    n = max(round(2 * d),3);
    rotate([0,0,180])
        cylinder(h = h, r = (d / 2) / cos (180 / n), $fn = n);
}
// main file
// PRUSA Mendel  
// X-end with NEMA 17 motor mount
// GNU GPL v2
// Josef Průša
// josefprusa@me.com
// prusadjs.cz
// http://www.reprap.org/wiki/Prusa_Mendel
// http://github.com/prusajr/PrusaMendel

include <configuration.scad>
corection = 1.17; 

/**
 * @name X end motor
 * @category Printed
 * @using 2 bushing
 * @using 4 m3x10xhex
 * @using 4 m3washer
 * @using 1 m8spring
 * @using 2 m8nut
 */  




use <x-end.scad>
module xendmotor(){
difference(){
union(){
difference ()
	{
		union ()
		{
			xend(56.39);		
			positioned_motor_mount();
		}
		positioned_motor_mount_holes();
	}
}
xendcorners(5,0,5,5,0);
}
}

// GregFrosts stuff
nema17_hole_spacing=1.2*25.4; 
nema17_width=1.7*25.4;
thickness=9;
nema17_support_d=nema17_width-nema17_hole_spacing;
motor_mount_rotation=[0,0,0];
motor_mount_translation=[44-thickness,8,23.5-4.7-12+24.5];

top_corner=motor_mount_translation+[thickness,nema17_width/2,nema17_width/2];
bridge_length=top_corner[0]-6.5;
bridge_shear=0.503;

module positioned_motor_mount()
{
	difference ()
	{
		translate(motor_mount_translation)
		union()
		{
			rotate([0,90,0])
			motor_mount ();
			
			translate(-motor_mount_translation)
			{
				translate(top_corner+
				[-bridge_length,-nema17_support_d-bridge_shear*bridge_length,-2.5])
				multmatrix([[1,0,0],[bridge_shear,1,0],[0,0,1]])
				cube([bridge_length,nema17_support_d,6]);
				
				render()
				translate(top_corner+[-thickness,-nema17_support_d,-nema17_support_d/2])
				intersection()
				{
					translate([0,-bridge_shear*thickness,0])
					multmatrix([[1,0,0],[bridge_shear,1,0],[0,0,1]])
					cube([thickness,nema17_support_d,nema17_support_d/2]);
					cube([thickness,nema17_support_d,nema17_support_d/2]);
				}
				
			
			}
			
			render()
			intersection()
			{
				translate([0,-nema17_width/2+nema17_support_d/2,1])
				rotate([0,90,0])
				translate([3.6*1.5*thickness,0,-thickness])
				multmatrix([[1,0,-3.6],[0,1,0],[0,0,2]])
				{
					rotate(90)
					linear_extrude(height=thickness)
					barbell(nema17_support_d/2,
					nema17_support_d/2,20,60,nema17_hole_spacing);
					translate([-20,-nema17_support_d/2,0])
					cube([20,nema17_width,thickness]);
				}
				
				translate([0,0,-motor_mount_translation[2]+15.8/2])
				cube([thickness*3,nema17_width,15.8],true);
			}
		}

	translate(motor_mount_translation)
	translate([-25,-nema17_width/2-1-16,-32])
	cube([20,nema17_width+2,20]);

	}
}

module positioned_motor_mount_holes()
{
	translate(motor_mount_translation)
	rotate([0,90,0])
	motor_mount_holes ();
}

module motor_mount ()
{
	rotate(motor_mount_rotation)
	{
		for (hole=[1,2])
		rotate([0,0,90*hole])
		linear_extrude(height=thickness)
		translate(-nema17_hole_spacing*[1,1,0]/2)
		barbell (nema17_support_d/2,
		nema17_support_d/2,20,60,nema17_hole_spacing);
		% cube([nema17_width,nema17_width,0.1],true);
	}
}

module motor_mount_holes ()
{
	// Motor mount holes. 
	translate([0,0,-1])
	rotate(motor_mount_rotation)
	{
		for (hole=[3:5])
		rotate([0,0,90*hole])
		translate(nema17_hole_spacing*[1,1,0]/2)
		rotate(360/16)
		cylinder(h=thickness+2,r=4.4/2,$fn=8);
		
		for (hole=[3:5])
		rotate([0,0,90*hole])
		translate(nema17_hole_spacing*[1,1,0]/2)
		translate([0,0,-24])
		cylinder(h=25,r=7/2);
	}
}

module barbell (r1,r2,r3,r4,separation) 
{
	x1=[0,0];
	x2=[separation,0];
	x3=triangulate (x1,x2,r1+r3,r2+r3);
	x4=triangulate (x2,x1,r2+r4,r1+r4);
	# render()
	difference ()
	{
		union()
		{
			translate(x1)
			circle (r=r1);
			translate(x2)
			circle(r=r2);
			polygon (points=[x1,x3,x2,x4]);
		}
		translate(x3)
		circle(r=r3,$fa=5);
		translate(x4)
		circle(r=r4,$fa=5);
	}
}

function triangulate (point1, point2, length1, length2) = 
point1 + 
length1*rotated(
atan2(point2[1]-point1[1],point2[0]-point1[0])+
angle(distance(point1,point2),length1,length2));

function distance(point1,point2)=
sqrt((point1[0]-point2[0])*(point1[0]-point2[0])+
(point1[1]-point2[1])*(point1[1]-point2[1]));

function angle(a,b,c) = acos((a*a+b*b-c*c)/(2*a*b)); 

function rotated(a)=[cos(a),sin(a),0];
xendmotor();
